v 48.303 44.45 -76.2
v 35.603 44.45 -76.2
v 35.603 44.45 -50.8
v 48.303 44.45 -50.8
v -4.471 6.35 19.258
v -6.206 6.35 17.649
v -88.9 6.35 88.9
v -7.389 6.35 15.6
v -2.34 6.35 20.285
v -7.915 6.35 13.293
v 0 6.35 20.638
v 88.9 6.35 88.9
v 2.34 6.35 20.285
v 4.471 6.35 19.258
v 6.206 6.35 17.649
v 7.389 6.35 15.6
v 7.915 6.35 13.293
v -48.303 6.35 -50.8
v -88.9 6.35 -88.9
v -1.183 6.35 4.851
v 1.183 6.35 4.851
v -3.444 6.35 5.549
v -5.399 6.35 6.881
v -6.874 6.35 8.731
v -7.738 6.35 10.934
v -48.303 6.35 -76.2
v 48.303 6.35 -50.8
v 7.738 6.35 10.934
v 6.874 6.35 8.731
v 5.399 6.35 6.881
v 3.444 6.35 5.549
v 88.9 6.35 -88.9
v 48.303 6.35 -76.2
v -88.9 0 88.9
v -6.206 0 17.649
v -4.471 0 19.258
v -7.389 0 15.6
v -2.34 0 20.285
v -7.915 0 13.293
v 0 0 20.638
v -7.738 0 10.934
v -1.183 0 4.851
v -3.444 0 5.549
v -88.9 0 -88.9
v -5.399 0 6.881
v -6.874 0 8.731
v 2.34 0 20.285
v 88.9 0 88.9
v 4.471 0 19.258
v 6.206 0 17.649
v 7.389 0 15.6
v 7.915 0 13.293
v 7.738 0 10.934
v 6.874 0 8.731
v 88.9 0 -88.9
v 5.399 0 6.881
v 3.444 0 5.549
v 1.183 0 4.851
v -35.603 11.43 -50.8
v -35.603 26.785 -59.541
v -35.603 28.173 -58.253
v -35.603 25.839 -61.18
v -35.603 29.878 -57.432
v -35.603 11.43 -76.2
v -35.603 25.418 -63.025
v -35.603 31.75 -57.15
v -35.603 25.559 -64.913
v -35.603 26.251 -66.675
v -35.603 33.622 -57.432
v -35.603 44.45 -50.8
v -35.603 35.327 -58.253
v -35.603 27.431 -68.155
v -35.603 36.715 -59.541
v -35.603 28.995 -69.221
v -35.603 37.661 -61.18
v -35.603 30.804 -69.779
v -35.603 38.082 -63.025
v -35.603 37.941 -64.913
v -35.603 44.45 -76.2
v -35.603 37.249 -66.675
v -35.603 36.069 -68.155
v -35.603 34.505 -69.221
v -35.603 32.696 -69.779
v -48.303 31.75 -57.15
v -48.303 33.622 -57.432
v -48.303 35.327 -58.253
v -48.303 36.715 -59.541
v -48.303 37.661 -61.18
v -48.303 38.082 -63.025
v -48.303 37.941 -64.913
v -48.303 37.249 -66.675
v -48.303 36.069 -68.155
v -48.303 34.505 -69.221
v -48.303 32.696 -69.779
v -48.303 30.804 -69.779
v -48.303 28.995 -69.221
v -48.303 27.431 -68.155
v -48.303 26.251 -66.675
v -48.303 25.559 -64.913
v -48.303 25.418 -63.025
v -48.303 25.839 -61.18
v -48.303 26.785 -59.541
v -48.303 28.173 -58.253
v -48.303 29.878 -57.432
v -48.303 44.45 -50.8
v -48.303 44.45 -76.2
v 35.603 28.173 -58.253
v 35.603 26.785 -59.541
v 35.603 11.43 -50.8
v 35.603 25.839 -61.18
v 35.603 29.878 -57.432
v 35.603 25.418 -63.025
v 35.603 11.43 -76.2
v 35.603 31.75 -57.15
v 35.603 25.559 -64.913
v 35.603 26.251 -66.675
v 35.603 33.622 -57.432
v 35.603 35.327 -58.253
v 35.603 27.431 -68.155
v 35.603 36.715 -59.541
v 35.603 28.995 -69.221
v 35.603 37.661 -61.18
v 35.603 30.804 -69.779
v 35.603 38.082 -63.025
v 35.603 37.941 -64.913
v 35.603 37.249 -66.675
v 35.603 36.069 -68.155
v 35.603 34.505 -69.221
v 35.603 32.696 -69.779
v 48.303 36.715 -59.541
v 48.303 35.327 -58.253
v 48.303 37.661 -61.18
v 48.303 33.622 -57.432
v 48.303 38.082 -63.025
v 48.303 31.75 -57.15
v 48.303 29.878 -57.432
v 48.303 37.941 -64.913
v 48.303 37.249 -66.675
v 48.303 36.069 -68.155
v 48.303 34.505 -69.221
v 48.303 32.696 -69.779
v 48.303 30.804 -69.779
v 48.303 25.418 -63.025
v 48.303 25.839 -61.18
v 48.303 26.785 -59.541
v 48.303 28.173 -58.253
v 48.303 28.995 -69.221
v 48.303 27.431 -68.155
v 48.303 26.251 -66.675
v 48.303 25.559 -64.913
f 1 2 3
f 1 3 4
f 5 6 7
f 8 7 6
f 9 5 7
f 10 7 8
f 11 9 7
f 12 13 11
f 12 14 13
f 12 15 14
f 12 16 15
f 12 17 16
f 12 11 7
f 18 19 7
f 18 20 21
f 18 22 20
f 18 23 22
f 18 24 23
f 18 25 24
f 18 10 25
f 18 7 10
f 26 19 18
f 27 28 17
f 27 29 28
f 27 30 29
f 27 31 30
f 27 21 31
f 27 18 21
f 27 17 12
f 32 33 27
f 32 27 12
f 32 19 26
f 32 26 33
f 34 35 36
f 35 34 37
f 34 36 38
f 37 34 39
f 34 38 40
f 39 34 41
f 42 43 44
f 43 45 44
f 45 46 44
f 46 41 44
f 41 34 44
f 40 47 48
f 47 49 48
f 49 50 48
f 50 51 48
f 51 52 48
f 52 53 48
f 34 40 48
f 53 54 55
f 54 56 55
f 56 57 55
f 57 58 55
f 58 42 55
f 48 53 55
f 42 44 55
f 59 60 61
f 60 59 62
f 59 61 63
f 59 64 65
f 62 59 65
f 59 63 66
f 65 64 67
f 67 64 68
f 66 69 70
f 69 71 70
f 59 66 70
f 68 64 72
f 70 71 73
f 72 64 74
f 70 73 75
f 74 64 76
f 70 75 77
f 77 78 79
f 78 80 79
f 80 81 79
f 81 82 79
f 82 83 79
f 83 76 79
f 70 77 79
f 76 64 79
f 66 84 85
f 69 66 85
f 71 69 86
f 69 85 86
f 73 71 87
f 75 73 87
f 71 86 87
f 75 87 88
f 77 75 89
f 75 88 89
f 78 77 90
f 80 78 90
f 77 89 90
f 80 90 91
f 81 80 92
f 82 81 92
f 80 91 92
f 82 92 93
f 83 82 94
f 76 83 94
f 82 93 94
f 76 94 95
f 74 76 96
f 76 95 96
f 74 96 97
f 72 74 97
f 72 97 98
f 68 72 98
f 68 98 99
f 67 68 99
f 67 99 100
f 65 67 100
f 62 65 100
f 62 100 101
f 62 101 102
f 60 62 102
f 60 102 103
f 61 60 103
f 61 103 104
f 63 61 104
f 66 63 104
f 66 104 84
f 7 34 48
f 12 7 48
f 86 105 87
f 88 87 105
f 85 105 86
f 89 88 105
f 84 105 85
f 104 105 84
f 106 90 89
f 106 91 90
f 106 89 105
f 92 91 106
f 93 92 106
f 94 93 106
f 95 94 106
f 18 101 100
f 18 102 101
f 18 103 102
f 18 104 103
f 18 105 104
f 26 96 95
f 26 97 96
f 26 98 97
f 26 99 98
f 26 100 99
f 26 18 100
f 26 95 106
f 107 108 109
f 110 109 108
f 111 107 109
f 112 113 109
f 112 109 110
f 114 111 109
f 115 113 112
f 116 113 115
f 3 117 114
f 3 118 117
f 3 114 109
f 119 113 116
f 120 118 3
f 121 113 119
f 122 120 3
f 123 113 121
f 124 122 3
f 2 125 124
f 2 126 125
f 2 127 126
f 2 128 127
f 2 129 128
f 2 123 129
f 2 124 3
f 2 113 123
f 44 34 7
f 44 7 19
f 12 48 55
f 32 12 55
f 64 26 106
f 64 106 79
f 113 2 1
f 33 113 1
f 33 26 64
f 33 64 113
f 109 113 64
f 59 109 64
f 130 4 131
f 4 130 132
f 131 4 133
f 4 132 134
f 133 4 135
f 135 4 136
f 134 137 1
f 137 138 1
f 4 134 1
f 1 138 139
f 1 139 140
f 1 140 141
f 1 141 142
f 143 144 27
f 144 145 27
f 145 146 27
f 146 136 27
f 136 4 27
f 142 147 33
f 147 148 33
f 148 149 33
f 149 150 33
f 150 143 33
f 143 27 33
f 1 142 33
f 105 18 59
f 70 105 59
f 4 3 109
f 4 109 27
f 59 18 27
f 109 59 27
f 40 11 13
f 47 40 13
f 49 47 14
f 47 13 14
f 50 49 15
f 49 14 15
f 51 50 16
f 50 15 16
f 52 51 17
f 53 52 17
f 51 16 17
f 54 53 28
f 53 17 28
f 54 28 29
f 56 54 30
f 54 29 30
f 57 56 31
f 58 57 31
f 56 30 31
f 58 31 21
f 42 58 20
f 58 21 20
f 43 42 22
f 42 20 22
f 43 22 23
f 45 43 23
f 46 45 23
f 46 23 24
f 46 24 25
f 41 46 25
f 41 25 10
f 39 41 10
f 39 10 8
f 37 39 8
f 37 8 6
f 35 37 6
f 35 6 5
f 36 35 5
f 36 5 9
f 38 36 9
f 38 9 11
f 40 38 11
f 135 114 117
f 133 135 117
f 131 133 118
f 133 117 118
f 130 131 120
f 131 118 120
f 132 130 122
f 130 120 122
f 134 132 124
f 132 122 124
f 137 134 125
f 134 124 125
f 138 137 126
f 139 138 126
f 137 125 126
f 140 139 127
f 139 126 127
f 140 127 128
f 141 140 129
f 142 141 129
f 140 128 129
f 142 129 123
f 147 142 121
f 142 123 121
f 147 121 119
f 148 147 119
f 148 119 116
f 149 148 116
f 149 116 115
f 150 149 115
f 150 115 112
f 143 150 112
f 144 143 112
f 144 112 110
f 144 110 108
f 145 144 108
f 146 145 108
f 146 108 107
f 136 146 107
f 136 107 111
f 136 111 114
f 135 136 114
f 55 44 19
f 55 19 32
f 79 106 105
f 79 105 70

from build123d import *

# Parameters (mm, degrees)
SKETCH1_W           = 177.8
SKETCH1_H           = 177.8
BOSS_EXTRUDE1_DEPTH = 6.35
SKETCH2_R           = 7.9375
CUT_EXTRUDE1_DEPTH  = 126.88384527
SKETCH3_W           = 96.606953724
SKETCH3_H           = 25.4
BOSS_EXTRUDE2_DEPTH = 38.1
CUT_EXTRUDE2_REACH  = 194.71
SKETCH4_W           = 71.206953724
SKETCH4_H           = 33.02
SKETCH5_R           = 6.35
CUT_EXTRUDE3_DEPTH  = 170.421977804


with BuildPart() as part:
    # Sketch1 → Boss-Extrude1 (new body)
    with BuildSketch(Plane(origin=(0, 0, 0), x_dir=(1, 0, 0), z_dir=(0, 1, 0))):
        Rectangle(SKETCH1_W, SKETCH1_H)
    extrude(amount=BOSS_EXTRUDE1_DEPTH)

    # Sketch2 → Cut-Extrude1 (cut, through all)
    with BuildSketch(Plane(origin=(0, 6.35, 0), x_dir=(1, 0, 0), z_dir=(0, 1, 0))):
        with Locations(Location((0, -12.7, 0), (0, 0, 270))):
            Circle(SKETCH2_R)
    extrude(amount=-CUT_EXTRUDE1_DEPTH, mode=Mode.SUBTRACT)

    # Sketch3 → Boss-Extrude2 (add)
    with BuildSketch(Plane(origin=(0, 6.35, 0), x_dir=(1, 0, 0), z_dir=(0, 1, 0))):
        with Locations((0, 63.5)):
            Rectangle(SKETCH3_W, SKETCH3_H)
    extrude(amount=BOSS_EXTRUDE2_DEPTH)

    # Sketch4 → Cut-Extrude2 (cut, up to next)
    with BuildSketch(Plane(origin=(0, 0, -76.2), x_dir=(-1, 0, 0), z_dir=(0, 0, -1)), mode=Mode.PRIVATE) as cut_extrude2_sk1:
        with Locations((0, 27.94)):
            Rectangle(SKETCH4_W, SKETCH4_H)
    cut_extrude2_tool1 = extrude(cut_extrude2_sk1.sketch, amount=-CUT_EXTRUDE2_REACH, mode=Mode.PRIVATE) & part.part
    add(cut_extrude2_tool1.solids().sort_by_distance((0, 27.94, -76.2))[0], mode=Mode.SUBTRACT)

    # Sketch5 → Cut-Extrude3 (cut, through all)
    with BuildSketch(Plane.ZY.offset(48.303476862)):
        with Locations((-63.5, 31.75)):
            Circle(SKETCH5_R)
    extrude(amount=-CUT_EXTRUDE3_DEPTH, mode=Mode.SUBTRACT)


solid = part.part
